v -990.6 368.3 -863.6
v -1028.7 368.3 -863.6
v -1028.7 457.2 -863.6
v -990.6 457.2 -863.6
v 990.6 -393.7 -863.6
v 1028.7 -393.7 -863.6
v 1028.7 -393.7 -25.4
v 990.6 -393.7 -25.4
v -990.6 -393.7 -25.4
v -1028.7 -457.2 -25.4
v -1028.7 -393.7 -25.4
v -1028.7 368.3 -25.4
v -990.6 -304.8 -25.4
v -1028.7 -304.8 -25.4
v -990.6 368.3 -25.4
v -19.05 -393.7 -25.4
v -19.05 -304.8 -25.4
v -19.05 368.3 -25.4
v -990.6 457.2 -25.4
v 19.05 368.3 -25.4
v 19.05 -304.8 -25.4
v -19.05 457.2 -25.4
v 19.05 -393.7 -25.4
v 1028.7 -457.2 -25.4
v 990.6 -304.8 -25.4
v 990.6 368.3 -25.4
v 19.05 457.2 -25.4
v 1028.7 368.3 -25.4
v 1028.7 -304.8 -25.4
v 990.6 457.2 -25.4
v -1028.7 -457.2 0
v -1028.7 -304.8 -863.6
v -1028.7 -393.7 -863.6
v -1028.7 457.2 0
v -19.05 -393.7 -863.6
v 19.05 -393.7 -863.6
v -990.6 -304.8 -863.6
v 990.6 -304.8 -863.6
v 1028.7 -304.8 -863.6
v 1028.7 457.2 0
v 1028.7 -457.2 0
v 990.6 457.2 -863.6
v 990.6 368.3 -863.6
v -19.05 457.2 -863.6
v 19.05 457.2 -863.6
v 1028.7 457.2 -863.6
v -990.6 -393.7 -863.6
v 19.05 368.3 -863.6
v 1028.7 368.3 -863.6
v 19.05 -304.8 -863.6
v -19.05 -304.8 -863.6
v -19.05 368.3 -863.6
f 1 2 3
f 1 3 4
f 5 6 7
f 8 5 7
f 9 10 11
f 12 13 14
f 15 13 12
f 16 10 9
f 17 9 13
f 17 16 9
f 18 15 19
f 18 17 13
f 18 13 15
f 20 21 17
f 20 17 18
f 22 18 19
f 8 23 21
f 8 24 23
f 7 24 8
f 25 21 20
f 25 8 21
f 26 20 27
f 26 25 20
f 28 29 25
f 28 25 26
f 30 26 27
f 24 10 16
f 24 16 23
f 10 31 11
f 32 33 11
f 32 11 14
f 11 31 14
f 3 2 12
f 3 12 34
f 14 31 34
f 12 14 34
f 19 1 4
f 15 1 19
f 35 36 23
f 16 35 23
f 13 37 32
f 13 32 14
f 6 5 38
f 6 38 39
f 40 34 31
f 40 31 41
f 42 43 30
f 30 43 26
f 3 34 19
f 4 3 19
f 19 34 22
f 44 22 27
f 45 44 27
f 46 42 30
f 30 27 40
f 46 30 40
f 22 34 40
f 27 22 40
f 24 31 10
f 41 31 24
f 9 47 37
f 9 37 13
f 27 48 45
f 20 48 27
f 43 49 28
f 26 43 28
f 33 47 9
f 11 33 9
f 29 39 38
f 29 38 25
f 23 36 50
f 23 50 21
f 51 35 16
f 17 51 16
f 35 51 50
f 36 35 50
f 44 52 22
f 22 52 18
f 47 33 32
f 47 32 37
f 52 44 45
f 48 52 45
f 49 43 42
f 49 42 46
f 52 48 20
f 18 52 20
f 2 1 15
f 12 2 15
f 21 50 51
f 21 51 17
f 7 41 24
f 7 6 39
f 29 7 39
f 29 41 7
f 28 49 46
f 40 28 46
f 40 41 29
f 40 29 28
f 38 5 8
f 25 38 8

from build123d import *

# Parameters (mm, degrees)
F0_W     = 2057.4
F0_H     = 914.4
F1_DEPTH = 863.6
F2_W     = 63.5
F2_H     = 838.2
F2_W_2   = 673.1
F3_DEPTH = 2057.401
F4_W     = 971.55
F4_H     = 838.2
F5_DEPTH = 850.901


with BuildPart() as f1:
    # F0 (on Top) → F1 (new body)
    with BuildSketch(Plane.XY):
        Rectangle(F0_W, F0_H)
    extrude(amount=-F1_DEPTH)

    # F2 (on face) → F3 (cut, through all)
    with BuildSketch(Plane.YZ.offset(1028.7)):
        with Locations((-425.45, -444.5)):
            Rectangle(F2_W, F2_H)
        with Locations((31.75, -444.5)):
            Rectangle(F2_W_2, F2_H)
    extrude(amount=-F3_DEPTH, mode=Mode.SUBTRACT)

    # F4 (on face) → F5 (cut, through all)
    with BuildSketch(Plane.XZ.offset(393.7)):
        with Locations((-504.825, -444.5)):
            Rectangle(F4_W, F4_H)
        with Locations((504.825, -444.5)):
            Rectangle(F4_W, F4_H)
    extrude(amount=-F5_DEPTH, mode=Mode.SUBTRACT)


solid = f1.part
